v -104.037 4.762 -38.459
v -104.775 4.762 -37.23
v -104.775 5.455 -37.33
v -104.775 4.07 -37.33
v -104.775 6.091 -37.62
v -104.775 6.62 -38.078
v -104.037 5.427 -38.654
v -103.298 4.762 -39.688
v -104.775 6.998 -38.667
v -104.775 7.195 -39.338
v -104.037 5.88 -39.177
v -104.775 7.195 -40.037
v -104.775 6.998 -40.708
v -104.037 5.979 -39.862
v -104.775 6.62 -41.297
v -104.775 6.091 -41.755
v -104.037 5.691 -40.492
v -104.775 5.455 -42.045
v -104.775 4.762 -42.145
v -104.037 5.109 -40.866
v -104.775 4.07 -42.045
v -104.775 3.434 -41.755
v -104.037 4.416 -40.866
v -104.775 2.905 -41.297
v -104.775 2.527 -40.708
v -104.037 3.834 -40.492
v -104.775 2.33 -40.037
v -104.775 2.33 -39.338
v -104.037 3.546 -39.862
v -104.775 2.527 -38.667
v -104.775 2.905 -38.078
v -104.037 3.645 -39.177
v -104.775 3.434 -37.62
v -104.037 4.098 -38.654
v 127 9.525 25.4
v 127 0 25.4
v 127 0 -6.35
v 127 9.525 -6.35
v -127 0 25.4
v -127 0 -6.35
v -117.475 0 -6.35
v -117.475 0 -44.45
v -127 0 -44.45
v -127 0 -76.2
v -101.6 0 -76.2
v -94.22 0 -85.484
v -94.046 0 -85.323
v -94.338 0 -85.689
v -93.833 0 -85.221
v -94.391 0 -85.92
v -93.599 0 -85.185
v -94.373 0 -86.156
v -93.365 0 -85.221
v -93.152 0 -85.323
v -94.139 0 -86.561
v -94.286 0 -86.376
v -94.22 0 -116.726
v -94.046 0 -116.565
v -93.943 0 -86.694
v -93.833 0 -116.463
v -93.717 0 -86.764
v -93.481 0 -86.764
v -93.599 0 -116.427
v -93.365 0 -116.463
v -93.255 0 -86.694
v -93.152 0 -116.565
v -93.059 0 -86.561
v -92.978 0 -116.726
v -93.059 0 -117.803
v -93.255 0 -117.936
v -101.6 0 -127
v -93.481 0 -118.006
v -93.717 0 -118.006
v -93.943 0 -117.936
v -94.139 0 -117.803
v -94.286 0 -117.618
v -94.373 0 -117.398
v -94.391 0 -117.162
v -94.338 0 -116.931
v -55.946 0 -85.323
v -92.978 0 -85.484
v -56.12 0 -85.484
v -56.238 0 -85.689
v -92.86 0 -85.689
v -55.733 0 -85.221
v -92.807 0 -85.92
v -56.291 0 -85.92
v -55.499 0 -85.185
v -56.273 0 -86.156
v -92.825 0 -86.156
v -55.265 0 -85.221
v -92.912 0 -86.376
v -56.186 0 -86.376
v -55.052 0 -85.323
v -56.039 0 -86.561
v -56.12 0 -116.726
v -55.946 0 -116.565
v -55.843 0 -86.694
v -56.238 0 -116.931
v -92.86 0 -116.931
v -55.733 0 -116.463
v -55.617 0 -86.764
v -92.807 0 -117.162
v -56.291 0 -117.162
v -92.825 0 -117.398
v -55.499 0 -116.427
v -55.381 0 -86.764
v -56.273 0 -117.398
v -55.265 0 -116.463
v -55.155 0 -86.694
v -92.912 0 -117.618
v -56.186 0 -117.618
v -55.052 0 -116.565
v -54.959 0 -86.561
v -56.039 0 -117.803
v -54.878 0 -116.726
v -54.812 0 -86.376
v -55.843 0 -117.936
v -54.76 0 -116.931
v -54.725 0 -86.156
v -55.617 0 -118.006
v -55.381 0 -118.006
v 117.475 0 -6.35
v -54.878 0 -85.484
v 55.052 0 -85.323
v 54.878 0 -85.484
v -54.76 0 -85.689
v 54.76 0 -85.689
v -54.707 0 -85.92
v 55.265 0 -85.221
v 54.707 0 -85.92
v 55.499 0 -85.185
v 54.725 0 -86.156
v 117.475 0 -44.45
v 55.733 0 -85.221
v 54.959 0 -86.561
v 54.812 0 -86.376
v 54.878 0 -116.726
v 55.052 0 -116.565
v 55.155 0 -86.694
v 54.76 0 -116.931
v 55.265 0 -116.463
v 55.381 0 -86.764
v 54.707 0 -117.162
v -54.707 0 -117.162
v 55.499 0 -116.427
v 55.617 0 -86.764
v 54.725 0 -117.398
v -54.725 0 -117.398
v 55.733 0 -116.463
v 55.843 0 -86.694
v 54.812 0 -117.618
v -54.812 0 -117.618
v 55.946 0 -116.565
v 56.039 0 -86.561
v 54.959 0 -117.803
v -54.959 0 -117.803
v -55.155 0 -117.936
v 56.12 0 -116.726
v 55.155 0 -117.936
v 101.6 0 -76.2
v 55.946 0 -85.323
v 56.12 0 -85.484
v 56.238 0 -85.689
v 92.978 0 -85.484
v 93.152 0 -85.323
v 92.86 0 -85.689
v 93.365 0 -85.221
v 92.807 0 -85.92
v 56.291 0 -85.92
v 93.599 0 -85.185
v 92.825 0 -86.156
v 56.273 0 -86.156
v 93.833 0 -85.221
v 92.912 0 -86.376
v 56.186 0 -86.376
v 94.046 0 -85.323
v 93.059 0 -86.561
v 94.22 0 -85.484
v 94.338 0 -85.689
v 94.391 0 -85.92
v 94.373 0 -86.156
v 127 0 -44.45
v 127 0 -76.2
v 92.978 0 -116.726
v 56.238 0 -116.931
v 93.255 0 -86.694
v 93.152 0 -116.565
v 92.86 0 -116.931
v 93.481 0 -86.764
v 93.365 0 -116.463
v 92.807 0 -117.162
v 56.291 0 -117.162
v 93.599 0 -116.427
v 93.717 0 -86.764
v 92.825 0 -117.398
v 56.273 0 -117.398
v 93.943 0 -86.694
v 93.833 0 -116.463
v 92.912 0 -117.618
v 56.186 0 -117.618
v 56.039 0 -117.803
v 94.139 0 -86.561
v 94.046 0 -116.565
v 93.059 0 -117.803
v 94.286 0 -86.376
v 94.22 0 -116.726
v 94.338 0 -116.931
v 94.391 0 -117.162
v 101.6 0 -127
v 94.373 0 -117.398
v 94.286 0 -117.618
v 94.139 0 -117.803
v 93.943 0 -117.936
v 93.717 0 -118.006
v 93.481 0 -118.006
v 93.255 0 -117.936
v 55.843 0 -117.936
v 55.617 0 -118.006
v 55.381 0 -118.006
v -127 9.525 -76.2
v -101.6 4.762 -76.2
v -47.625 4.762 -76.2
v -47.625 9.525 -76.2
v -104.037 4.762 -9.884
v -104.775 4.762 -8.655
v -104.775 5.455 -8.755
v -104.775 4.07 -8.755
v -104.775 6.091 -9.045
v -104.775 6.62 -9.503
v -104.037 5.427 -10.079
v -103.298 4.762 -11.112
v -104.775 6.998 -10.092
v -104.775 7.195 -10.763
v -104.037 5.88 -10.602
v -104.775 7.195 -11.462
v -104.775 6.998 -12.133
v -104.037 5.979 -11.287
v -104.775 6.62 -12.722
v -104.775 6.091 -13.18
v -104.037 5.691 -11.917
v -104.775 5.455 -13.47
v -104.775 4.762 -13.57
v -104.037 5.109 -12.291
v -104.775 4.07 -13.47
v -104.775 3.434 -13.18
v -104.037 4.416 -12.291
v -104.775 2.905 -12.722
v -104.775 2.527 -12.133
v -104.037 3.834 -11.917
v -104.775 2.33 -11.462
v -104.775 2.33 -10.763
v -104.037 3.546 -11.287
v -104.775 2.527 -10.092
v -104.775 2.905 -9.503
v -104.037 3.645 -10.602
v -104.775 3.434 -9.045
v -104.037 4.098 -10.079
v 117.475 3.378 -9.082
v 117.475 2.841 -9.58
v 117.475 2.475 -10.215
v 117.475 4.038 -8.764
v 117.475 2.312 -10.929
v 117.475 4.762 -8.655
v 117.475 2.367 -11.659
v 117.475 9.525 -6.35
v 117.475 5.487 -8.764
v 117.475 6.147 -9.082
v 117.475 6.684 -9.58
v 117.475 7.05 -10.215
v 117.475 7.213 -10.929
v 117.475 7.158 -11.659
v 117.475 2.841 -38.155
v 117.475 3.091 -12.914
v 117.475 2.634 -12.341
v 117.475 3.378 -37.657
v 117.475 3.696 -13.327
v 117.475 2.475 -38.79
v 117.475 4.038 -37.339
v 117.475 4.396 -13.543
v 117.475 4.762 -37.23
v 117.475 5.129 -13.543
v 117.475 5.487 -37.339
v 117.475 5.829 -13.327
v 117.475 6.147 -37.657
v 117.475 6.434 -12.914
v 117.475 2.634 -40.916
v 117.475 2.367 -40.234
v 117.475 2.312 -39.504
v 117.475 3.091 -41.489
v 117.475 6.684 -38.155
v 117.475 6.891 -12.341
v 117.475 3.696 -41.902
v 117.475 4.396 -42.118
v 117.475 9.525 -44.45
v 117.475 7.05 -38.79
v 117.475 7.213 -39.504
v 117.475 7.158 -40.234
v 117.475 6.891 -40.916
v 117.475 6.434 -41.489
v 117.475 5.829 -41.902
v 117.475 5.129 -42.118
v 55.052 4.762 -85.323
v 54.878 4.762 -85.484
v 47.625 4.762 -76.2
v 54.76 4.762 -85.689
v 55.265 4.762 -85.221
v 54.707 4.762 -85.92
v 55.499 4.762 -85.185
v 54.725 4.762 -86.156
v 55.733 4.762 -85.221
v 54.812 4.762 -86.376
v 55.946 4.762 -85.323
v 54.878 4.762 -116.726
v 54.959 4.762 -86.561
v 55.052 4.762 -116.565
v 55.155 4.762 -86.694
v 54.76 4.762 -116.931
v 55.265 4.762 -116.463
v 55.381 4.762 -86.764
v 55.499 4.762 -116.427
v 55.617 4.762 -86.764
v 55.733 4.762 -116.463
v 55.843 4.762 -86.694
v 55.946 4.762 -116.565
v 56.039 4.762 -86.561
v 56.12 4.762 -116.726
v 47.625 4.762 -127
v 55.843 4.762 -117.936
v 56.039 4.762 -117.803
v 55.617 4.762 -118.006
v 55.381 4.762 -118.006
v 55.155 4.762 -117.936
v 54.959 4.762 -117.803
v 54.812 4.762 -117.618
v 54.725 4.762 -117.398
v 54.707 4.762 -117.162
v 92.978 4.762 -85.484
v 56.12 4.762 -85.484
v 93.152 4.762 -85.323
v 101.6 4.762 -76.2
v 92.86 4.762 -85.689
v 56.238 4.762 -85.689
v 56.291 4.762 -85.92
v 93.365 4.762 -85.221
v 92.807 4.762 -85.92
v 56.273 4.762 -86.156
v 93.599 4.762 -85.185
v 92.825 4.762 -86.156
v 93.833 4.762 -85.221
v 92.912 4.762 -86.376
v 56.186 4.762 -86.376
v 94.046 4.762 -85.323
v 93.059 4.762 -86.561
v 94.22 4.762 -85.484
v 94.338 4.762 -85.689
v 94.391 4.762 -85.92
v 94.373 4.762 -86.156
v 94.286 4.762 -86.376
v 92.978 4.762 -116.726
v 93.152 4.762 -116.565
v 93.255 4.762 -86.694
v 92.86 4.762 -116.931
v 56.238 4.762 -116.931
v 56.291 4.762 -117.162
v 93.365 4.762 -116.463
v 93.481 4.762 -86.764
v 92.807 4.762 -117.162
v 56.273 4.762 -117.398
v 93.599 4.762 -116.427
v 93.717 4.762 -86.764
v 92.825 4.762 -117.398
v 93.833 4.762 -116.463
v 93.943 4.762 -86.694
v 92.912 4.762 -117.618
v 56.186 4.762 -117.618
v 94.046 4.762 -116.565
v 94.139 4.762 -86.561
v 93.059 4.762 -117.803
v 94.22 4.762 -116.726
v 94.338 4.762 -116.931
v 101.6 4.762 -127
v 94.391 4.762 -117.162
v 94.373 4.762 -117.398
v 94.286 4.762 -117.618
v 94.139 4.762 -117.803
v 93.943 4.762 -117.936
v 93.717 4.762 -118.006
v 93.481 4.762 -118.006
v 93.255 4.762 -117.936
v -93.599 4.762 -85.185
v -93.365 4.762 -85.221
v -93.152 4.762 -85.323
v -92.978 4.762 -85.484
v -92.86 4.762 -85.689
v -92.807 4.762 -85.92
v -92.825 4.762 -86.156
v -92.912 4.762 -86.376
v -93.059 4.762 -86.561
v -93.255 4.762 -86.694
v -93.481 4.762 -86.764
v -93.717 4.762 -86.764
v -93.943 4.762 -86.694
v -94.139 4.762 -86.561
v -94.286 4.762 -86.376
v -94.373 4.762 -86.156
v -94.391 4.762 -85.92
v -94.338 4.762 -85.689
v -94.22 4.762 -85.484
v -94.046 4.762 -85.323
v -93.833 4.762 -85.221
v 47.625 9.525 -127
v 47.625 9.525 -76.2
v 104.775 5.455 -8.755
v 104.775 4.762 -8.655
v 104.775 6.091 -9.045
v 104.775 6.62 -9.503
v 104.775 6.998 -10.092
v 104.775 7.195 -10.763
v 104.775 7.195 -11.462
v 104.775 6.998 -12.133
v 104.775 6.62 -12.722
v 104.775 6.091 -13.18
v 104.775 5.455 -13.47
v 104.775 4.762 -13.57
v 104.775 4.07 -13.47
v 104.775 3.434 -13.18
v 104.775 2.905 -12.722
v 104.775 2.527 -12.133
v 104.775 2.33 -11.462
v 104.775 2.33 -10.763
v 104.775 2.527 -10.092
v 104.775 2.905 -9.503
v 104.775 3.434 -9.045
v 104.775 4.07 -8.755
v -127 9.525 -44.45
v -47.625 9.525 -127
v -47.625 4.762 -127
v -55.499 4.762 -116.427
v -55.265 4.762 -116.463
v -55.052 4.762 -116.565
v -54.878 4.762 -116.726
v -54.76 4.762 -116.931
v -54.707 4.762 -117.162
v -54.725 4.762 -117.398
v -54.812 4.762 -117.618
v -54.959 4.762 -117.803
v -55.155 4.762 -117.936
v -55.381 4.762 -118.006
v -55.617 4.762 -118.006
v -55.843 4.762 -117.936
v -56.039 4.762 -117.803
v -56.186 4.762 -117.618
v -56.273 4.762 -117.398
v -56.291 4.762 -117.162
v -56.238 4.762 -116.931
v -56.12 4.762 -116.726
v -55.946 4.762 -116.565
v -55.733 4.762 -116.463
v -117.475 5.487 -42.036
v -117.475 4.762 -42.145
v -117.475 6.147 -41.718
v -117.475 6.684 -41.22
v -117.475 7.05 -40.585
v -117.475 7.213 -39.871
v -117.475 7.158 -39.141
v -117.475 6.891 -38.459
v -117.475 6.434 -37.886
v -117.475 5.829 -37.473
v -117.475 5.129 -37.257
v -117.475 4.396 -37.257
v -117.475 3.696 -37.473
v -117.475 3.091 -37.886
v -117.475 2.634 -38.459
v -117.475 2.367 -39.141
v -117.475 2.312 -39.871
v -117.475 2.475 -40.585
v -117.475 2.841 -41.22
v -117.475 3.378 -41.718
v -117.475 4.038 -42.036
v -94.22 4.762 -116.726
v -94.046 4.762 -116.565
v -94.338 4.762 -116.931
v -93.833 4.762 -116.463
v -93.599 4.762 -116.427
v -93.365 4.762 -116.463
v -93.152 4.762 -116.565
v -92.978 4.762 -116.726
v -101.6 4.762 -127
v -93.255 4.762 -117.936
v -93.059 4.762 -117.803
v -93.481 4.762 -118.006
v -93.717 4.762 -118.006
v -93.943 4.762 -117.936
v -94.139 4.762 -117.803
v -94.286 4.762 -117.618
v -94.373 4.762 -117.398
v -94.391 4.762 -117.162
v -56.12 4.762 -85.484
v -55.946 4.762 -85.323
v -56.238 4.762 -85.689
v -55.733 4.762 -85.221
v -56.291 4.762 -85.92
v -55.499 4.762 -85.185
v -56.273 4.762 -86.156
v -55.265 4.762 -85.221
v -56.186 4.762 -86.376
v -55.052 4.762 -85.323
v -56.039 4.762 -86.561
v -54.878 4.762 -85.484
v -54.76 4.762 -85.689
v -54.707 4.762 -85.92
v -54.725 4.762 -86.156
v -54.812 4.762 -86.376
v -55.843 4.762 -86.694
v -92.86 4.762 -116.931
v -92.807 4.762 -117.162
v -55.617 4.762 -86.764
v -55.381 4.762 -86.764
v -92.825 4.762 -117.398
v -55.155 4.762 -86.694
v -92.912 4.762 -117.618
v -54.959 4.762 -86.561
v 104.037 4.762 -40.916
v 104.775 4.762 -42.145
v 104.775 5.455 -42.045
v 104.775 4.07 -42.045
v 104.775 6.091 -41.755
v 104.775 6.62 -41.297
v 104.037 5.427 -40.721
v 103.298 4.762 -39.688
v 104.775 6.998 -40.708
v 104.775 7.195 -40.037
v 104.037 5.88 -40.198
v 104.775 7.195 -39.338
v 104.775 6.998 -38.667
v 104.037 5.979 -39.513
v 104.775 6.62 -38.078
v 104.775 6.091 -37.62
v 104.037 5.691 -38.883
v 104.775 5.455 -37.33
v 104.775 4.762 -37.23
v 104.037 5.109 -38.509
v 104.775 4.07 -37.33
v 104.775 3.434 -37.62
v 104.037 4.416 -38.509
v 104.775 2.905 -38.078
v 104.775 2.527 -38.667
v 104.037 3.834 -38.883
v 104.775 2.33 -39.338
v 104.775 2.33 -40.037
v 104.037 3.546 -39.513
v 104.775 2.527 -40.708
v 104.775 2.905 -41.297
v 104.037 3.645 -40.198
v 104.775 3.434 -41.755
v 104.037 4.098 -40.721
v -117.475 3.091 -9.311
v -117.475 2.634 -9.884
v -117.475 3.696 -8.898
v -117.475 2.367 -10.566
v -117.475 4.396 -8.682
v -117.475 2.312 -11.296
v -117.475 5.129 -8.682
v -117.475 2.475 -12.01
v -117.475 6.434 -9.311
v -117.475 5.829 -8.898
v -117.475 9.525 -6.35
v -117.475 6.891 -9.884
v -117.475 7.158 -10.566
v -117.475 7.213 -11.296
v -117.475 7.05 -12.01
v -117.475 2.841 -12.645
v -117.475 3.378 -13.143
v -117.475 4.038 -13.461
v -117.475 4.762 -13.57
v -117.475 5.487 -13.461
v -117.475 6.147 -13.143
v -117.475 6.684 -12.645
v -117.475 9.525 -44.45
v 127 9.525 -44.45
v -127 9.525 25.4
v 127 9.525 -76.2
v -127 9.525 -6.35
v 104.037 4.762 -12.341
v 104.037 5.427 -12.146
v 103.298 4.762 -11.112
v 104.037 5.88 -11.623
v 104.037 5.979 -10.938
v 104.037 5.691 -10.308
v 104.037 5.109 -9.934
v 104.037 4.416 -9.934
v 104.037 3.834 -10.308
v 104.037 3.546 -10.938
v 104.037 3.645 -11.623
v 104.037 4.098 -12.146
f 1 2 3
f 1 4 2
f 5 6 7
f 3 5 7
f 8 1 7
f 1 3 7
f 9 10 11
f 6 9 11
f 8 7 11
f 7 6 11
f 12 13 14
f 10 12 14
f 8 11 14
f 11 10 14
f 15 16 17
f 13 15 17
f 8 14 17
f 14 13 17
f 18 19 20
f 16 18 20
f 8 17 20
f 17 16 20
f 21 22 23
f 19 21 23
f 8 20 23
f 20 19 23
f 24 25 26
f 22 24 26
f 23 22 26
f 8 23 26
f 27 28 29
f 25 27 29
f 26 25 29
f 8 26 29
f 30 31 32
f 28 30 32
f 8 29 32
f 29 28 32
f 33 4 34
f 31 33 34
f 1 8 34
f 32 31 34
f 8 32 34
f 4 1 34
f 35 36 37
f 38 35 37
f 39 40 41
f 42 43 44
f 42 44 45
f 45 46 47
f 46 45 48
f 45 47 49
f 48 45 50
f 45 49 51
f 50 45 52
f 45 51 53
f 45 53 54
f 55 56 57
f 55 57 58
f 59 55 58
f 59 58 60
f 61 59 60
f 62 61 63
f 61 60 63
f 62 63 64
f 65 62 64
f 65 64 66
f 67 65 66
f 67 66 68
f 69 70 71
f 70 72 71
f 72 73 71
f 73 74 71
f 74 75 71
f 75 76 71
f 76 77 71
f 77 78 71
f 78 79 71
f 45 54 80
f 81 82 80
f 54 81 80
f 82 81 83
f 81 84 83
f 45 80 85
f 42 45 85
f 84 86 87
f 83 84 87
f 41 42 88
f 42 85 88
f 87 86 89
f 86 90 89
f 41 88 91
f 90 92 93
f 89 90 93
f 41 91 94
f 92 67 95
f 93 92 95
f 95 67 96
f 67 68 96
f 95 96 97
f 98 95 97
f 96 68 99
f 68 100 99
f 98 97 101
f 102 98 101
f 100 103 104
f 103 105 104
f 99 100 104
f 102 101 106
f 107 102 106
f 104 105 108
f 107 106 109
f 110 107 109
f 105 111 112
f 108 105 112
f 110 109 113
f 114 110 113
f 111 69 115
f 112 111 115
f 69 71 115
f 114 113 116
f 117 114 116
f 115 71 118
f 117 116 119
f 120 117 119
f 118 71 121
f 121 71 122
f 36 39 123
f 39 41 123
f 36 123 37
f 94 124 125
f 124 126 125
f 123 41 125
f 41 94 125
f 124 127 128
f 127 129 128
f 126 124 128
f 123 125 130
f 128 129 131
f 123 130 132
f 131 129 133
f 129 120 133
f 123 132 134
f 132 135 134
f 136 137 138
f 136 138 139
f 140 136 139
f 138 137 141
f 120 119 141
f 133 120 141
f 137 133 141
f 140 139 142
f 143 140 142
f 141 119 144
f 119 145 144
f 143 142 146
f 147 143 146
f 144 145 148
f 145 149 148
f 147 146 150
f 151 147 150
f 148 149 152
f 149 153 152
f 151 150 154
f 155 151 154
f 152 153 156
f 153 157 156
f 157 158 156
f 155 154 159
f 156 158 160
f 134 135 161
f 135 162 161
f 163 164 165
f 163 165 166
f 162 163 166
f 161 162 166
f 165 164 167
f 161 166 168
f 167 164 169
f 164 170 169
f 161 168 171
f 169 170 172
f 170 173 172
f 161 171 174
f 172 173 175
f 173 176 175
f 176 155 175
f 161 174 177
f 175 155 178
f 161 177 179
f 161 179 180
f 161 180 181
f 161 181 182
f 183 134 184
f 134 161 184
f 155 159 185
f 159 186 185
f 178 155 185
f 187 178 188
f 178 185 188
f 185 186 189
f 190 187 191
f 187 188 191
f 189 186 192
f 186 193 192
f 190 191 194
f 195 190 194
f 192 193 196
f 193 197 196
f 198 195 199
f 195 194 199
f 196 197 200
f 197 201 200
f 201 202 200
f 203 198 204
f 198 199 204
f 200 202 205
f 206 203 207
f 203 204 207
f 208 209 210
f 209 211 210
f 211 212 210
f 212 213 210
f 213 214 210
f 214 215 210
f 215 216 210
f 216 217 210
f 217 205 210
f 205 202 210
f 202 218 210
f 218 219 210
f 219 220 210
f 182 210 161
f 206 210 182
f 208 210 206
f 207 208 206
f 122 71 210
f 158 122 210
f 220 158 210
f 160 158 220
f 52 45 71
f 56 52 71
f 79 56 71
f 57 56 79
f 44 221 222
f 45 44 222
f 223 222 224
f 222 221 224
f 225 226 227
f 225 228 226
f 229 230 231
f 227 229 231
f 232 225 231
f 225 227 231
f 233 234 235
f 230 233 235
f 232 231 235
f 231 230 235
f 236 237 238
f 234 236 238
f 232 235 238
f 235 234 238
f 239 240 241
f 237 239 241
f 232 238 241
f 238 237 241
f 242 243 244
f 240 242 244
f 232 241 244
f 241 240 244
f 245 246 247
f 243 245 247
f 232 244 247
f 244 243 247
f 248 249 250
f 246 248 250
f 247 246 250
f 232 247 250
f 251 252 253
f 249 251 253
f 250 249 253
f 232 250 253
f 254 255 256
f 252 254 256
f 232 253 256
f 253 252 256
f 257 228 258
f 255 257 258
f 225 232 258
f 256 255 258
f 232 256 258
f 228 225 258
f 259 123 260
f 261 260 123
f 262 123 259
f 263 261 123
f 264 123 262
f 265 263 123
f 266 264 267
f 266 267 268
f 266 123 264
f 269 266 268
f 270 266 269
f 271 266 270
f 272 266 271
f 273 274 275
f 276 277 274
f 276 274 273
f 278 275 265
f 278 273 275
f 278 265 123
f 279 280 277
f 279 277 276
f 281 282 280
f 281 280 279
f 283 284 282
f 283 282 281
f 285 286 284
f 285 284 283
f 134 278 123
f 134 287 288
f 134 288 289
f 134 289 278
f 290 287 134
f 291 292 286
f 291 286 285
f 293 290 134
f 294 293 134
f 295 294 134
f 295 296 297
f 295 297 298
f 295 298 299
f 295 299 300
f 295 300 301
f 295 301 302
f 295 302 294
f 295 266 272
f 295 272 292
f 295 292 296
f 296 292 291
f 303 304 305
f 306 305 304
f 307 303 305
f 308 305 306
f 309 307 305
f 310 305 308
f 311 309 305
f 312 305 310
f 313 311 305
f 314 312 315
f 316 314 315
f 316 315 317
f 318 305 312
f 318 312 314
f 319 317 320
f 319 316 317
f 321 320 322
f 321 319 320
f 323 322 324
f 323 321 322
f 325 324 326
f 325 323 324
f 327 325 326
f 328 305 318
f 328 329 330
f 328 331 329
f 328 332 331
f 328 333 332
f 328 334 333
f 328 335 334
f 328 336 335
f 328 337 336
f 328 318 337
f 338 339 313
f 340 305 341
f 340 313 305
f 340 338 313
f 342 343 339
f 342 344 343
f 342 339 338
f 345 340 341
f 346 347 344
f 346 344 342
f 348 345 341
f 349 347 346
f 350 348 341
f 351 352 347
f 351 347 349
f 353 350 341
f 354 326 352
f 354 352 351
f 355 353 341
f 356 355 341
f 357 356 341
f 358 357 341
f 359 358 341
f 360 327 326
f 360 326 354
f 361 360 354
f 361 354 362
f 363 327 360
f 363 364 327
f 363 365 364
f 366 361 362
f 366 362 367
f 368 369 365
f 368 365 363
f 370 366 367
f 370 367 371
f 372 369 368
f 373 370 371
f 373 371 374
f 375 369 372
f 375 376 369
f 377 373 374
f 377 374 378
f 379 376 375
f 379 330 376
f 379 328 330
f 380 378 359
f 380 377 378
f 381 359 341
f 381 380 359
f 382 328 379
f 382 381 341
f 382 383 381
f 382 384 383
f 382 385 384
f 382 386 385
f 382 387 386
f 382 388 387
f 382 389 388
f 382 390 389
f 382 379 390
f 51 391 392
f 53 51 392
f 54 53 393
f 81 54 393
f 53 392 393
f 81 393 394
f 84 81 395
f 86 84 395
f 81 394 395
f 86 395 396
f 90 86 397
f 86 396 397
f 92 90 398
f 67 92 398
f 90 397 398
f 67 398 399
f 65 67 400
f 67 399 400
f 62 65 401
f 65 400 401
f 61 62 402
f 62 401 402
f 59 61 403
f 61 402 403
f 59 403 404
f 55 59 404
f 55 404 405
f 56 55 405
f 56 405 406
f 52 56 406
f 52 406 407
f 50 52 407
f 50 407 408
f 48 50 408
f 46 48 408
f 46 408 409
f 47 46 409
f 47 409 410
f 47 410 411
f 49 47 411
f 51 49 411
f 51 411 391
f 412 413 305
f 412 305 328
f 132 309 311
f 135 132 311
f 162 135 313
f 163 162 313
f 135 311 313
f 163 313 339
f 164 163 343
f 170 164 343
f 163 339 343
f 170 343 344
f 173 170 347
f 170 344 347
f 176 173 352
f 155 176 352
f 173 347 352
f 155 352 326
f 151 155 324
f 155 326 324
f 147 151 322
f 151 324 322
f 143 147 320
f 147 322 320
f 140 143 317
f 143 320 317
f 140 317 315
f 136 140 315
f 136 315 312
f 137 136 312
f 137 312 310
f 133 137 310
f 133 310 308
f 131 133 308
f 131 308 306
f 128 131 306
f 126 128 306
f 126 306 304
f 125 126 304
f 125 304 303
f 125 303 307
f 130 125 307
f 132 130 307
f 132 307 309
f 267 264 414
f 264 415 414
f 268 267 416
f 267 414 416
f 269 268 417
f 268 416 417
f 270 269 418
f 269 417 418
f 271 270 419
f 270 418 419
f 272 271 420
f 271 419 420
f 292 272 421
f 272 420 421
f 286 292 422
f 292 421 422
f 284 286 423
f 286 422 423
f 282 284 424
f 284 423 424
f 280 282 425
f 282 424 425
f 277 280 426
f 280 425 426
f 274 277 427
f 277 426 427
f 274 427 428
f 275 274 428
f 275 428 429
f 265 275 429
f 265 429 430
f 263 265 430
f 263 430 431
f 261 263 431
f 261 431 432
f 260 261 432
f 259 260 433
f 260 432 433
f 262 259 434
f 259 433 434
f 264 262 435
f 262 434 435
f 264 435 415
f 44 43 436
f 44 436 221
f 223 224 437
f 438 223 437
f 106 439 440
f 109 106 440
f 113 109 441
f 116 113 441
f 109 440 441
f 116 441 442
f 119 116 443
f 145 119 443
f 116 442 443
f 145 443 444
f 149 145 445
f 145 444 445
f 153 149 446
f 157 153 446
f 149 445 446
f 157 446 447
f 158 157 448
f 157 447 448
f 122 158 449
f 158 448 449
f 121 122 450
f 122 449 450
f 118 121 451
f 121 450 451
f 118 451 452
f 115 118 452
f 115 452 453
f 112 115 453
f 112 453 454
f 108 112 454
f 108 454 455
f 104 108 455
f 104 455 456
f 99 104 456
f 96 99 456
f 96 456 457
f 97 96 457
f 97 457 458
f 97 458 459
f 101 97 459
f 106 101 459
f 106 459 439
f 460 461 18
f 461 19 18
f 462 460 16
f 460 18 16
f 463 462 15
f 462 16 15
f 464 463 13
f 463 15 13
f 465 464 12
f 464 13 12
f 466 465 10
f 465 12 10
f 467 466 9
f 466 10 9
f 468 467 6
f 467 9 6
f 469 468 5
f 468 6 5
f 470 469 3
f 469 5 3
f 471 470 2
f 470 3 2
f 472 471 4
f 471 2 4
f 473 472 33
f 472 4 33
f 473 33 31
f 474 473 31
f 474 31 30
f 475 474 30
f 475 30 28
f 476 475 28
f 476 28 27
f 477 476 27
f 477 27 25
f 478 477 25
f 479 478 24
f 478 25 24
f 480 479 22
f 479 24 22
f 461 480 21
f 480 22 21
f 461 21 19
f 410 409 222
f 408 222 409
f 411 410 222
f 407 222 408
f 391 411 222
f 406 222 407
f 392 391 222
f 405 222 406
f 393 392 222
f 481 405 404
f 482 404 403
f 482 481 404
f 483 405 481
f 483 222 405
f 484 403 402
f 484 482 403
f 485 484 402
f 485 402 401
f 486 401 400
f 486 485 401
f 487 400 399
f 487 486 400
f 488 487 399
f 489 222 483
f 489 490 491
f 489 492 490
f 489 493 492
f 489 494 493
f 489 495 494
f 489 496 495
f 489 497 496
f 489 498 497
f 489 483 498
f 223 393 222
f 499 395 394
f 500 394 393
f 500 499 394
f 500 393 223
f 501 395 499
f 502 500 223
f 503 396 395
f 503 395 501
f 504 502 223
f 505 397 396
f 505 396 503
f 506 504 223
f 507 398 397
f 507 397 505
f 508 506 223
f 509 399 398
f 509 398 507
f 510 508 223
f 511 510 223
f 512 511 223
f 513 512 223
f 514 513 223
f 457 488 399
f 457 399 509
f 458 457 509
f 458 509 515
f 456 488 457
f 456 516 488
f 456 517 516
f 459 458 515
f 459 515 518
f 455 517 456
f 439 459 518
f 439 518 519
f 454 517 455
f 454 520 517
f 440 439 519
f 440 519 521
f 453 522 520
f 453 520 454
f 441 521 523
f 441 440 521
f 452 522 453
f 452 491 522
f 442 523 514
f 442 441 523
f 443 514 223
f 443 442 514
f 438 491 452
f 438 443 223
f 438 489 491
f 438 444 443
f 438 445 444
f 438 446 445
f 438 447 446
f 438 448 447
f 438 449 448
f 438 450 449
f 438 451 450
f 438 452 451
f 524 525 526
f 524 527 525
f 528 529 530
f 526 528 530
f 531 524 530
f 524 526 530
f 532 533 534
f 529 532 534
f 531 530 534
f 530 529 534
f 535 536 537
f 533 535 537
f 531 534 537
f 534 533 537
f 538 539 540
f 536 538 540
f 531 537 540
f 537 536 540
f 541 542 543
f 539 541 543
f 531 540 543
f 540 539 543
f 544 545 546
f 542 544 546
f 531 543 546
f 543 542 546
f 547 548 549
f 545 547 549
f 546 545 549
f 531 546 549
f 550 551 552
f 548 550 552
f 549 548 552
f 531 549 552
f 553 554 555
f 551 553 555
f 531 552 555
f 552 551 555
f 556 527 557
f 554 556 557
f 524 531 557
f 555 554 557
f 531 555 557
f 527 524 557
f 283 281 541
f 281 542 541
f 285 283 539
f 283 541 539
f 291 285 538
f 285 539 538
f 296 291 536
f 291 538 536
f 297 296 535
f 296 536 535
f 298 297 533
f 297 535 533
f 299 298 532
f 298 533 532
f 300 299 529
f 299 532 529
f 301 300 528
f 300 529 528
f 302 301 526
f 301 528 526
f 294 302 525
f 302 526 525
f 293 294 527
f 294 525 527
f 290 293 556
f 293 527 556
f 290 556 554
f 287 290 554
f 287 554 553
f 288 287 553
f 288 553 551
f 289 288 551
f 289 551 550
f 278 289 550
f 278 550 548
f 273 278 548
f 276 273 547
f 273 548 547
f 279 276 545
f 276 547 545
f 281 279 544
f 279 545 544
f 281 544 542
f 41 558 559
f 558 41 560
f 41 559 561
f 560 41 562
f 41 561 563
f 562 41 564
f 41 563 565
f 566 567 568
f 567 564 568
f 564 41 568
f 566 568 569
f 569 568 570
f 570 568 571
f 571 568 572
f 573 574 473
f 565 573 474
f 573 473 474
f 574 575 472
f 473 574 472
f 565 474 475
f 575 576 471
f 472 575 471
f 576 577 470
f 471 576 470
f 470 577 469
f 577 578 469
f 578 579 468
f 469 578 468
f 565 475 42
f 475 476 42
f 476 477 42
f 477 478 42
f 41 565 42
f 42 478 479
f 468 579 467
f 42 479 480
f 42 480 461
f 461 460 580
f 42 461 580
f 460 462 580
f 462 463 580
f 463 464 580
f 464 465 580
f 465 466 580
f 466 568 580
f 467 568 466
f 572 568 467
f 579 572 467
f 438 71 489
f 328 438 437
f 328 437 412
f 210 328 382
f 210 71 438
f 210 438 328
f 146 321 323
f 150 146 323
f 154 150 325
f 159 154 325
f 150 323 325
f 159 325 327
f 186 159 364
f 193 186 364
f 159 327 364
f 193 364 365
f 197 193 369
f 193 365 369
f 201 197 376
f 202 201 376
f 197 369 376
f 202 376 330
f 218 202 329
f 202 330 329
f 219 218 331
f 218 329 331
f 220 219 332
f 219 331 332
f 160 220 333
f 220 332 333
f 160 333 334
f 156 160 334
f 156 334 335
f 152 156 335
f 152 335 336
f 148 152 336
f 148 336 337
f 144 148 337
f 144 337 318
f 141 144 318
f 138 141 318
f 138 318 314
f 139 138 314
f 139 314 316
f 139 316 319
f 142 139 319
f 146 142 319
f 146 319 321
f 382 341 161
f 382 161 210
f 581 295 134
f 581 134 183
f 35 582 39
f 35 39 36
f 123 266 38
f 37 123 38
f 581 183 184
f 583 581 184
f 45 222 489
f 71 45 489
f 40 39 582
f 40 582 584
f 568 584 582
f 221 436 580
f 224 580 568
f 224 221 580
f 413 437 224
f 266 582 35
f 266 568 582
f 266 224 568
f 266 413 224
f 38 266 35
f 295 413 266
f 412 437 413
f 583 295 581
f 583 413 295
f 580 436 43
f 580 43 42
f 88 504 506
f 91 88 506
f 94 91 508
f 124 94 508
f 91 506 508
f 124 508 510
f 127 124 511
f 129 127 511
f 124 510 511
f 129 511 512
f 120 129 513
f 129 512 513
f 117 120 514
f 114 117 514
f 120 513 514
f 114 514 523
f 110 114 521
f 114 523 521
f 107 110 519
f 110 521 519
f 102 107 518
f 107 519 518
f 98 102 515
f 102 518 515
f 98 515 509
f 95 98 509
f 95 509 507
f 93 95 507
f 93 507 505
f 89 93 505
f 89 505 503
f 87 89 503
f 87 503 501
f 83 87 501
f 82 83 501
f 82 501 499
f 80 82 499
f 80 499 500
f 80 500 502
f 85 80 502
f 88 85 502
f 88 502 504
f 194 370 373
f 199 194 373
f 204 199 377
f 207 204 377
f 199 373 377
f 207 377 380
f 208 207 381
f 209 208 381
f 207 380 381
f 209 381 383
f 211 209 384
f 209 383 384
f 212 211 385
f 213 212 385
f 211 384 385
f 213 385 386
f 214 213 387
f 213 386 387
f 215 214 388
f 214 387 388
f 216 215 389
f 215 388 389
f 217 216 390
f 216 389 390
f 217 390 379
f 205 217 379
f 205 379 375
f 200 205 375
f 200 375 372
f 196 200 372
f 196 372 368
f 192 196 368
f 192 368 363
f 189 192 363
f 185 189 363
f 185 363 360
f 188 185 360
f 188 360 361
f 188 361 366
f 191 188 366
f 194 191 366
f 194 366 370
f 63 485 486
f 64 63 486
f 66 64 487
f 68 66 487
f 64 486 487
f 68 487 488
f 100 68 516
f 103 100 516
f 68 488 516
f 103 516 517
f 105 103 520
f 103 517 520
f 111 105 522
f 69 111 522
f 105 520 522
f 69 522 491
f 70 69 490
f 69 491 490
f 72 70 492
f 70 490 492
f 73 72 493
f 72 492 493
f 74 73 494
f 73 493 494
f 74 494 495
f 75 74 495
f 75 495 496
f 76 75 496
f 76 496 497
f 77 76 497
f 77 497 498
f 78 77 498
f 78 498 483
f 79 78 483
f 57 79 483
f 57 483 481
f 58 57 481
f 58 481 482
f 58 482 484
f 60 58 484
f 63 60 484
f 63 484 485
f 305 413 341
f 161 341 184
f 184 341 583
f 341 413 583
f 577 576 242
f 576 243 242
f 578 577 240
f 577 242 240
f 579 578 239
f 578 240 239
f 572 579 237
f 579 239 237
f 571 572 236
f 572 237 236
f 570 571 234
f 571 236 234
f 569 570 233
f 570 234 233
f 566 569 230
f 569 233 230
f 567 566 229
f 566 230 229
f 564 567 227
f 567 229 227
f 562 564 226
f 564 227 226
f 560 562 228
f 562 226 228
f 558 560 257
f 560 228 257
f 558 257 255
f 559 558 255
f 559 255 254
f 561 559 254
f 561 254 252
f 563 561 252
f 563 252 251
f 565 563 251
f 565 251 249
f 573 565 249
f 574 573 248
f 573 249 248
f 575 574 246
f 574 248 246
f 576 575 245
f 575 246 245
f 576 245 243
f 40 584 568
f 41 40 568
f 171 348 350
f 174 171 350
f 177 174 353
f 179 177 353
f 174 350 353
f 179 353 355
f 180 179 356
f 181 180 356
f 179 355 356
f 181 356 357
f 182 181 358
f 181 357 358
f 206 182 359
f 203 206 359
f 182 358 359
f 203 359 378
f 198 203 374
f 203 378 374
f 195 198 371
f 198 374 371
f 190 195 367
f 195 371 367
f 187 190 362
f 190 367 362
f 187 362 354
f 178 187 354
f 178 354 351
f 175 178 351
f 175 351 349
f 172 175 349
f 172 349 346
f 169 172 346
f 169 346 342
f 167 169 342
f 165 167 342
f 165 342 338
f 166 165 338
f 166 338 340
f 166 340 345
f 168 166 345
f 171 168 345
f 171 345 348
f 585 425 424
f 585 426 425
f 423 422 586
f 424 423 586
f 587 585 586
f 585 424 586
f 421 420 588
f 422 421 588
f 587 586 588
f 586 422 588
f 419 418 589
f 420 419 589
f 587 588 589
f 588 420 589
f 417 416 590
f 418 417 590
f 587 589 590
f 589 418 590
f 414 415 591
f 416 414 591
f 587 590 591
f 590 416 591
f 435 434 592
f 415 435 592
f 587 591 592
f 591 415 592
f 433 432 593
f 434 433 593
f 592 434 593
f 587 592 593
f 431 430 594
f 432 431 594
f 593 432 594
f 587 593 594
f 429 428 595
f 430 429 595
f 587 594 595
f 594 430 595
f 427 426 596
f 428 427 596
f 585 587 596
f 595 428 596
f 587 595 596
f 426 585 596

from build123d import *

# Parameters (mm, degrees)
SKETCH1_W                        = 254
SKETCH1_H                        = 254
BOSS_EXTRUDE1_DEPTH              = 9.525
SKETCH2_W                        = 25.4
SKETCH2_H                        = 50.8
CUT_EXTRUDE1_DEPTH               = 180.857514786
SKETCH4_W                        = 53.975
SKETCH4_H                        = 50.8
CUT_EXTRUDE2_DEPTH               = 4.7625
SKETCH7_W                        = 9.525
SKETCH7_H                        = 38.1
CUT_EXTRUDE4_DEPTH               = 180.857514786
F_10_0_1935_DIAMETER_HOLE1_D     = 4.9149
F_10_0_1935_DIAMETER_HOLE1_DEPTH = 12.7
F_10_0_1935_DIAMETER_HOLE1_TIP   = 1.476584928
F_10_0_1935_DIAMETER_HOLE3_D     = 4.9149
F_10_0_1935_DIAMETER_HOLE3_DEPTH = 12.7
F_10_0_1935_DIAMETER_HOLE3_TIP   = 1.476584928
SKETCH16_R                       = 0.79375
CUT_EXTRUDE7_DEPTH               = 180.668253752
SKETCH17_W                       = 254
SKETCH17_H                       = 101.6
CUT_EXTRUDE8_DEPTH               = 180.857514786


with BuildPart() as part:
    # Sketch1 → Boss-Extrude1 (new body)
    with BuildSketch(Plane(origin=(0, 0, 0), x_dir=(1, 0, 0), z_dir=(0, 1, 0))):
        Rectangle(SKETCH1_W, SKETCH1_H)
    extrude(amount=BOSS_EXTRUDE1_DEPTH)

    # Sketch2 → Cut-Extrude1 (cut, through all)
    with BuildSketch(Plane(origin=(0, 9.525, 0), x_dir=(1, 0, 0), z_dir=(0, 1, 0))):
        with Locations((-114.3, 101.6)):
            Rectangle(SKETCH2_W, SKETCH2_H)
        with Locations((114.3, 101.6)):
            Rectangle(SKETCH2_W, SKETCH2_H)
    extrude(amount=-CUT_EXTRUDE1_DEPTH, mode=Mode.SUBTRACT)

    # Sketch4 → Cut-Extrude2 (cut)
    with BuildSketch(Plane(origin=(0, 9.525, 0), x_dir=(1, 0, 0), z_dir=(0, 1, 0))):
        with Locations((-74.6125, 101.6)):
            Rectangle(SKETCH4_W, SKETCH4_H)
        with Locations((74.6125, 101.6)):
            Rectangle(SKETCH4_W, SKETCH4_H)
    extrude(amount=-CUT_EXTRUDE2_DEPTH, mode=Mode.SUBTRACT)

    # Sketch7 → Cut-Extrude4 (cut, through all)
    with BuildSketch(Plane(origin=(0, 9.525, 0), x_dir=(1, 0, 0), z_dir=(0, 1, 0))):
        with Locations((-122.2375, 25.4)):
            Rectangle(SKETCH7_W, SKETCH7_H)
        with Locations((122.2375, 25.4)):
            Rectangle(SKETCH7_W, SKETCH7_H)
    extrude(amount=-CUT_EXTRUDE4_DEPTH, mode=Mode.SUBTRACT)

    # #10 (0.1935) Diameter Hole1
    with Locations(Plane(origin=(117.475, 0, 0), x_dir=(0, 0, -1), z_dir=(1, 0, 0))):
        with Locations((11.1125, 4.7625), (39.6875, 4.7625)):
            Hole(F_10_0_1935_DIAMETER_HOLE1_D / 2, depth=F_10_0_1935_DIAMETER_HOLE1_DEPTH)
            with Locations((0, 0, -(F_10_0_1935_DIAMETER_HOLE1_DEPTH + F_10_0_1935_DIAMETER_HOLE1_TIP / 2))):  # 118° drill point
                Cone(0, F_10_0_1935_DIAMETER_HOLE1_D / 2, F_10_0_1935_DIAMETER_HOLE1_TIP, mode=Mode.SUBTRACT)

    # #10 (0.1935) Diameter Hole3
    with Locations(Plane.ZY.offset(117.475)):
        with Locations((-39.6875, 4.7625), (-11.1125, 4.7625)):
            Hole(F_10_0_1935_DIAMETER_HOLE3_D / 2, depth=F_10_0_1935_DIAMETER_HOLE3_DEPTH)
            with Locations((0, 0, -(F_10_0_1935_DIAMETER_HOLE3_DEPTH + F_10_0_1935_DIAMETER_HOLE3_TIP / 2))):  # 118° drill point
                Cone(0, F_10_0_1935_DIAMETER_HOLE3_D / 2, F_10_0_1935_DIAMETER_HOLE3_TIP, mode=Mode.SUBTRACT)

    # Sketch16 → Cut-Extrude7 (cut, through all)
    with BuildSketch(Plane(origin=(0, 4.7625, 0), x_dir=(1, 0, 0), z_dir=(0, 1, 0))):
        with Locations(Location((93.599, 117.221, 0), (0, 0, 270))):
            Circle(SKETCH16_R)
        with Locations(Location((55.499, 117.221, 0), (0, 0, 270))):
            Circle(SKETCH16_R)
        with Locations(Location((55.499, 85.979, 0), (0, 0, 270))):
            Circle(SKETCH16_R)
        with Locations(Location((93.599, 85.979, 0), (0, 0, 270))):
            Circle(SKETCH16_R)
        with Locations(Location((-93.599, 85.979, 0), (0, 0, 270))):
            Circle(SKETCH16_R)
        with Locations(Location((-55.499, 85.979, 0), (0, 0, 270))):
            Circle(SKETCH16_R)
        with Locations(Location((-55.499, 117.221, 0), (0, 0, 270))):
            Circle(SKETCH16_R)
        with Locations(Location((-93.599, 117.221, 0), (0, 0, 270))):
            Circle(SKETCH16_R)
    extrude(amount=-CUT_EXTRUDE7_DEPTH, mode=Mode.SUBTRACT)

    # Sketch17 → Cut-Extrude8 (cut, through all)
    with BuildSketch(Plane(origin=(0, 9.525, 0), x_dir=(1, 0, 0), z_dir=(0, 1, 0))):
        with Locations((0, -76.2)):
            Rectangle(SKETCH17_W, SKETCH17_H)
    extrude(amount=-CUT_EXTRUDE8_DEPTH, mode=Mode.SUBTRACT)


solid = part.part
